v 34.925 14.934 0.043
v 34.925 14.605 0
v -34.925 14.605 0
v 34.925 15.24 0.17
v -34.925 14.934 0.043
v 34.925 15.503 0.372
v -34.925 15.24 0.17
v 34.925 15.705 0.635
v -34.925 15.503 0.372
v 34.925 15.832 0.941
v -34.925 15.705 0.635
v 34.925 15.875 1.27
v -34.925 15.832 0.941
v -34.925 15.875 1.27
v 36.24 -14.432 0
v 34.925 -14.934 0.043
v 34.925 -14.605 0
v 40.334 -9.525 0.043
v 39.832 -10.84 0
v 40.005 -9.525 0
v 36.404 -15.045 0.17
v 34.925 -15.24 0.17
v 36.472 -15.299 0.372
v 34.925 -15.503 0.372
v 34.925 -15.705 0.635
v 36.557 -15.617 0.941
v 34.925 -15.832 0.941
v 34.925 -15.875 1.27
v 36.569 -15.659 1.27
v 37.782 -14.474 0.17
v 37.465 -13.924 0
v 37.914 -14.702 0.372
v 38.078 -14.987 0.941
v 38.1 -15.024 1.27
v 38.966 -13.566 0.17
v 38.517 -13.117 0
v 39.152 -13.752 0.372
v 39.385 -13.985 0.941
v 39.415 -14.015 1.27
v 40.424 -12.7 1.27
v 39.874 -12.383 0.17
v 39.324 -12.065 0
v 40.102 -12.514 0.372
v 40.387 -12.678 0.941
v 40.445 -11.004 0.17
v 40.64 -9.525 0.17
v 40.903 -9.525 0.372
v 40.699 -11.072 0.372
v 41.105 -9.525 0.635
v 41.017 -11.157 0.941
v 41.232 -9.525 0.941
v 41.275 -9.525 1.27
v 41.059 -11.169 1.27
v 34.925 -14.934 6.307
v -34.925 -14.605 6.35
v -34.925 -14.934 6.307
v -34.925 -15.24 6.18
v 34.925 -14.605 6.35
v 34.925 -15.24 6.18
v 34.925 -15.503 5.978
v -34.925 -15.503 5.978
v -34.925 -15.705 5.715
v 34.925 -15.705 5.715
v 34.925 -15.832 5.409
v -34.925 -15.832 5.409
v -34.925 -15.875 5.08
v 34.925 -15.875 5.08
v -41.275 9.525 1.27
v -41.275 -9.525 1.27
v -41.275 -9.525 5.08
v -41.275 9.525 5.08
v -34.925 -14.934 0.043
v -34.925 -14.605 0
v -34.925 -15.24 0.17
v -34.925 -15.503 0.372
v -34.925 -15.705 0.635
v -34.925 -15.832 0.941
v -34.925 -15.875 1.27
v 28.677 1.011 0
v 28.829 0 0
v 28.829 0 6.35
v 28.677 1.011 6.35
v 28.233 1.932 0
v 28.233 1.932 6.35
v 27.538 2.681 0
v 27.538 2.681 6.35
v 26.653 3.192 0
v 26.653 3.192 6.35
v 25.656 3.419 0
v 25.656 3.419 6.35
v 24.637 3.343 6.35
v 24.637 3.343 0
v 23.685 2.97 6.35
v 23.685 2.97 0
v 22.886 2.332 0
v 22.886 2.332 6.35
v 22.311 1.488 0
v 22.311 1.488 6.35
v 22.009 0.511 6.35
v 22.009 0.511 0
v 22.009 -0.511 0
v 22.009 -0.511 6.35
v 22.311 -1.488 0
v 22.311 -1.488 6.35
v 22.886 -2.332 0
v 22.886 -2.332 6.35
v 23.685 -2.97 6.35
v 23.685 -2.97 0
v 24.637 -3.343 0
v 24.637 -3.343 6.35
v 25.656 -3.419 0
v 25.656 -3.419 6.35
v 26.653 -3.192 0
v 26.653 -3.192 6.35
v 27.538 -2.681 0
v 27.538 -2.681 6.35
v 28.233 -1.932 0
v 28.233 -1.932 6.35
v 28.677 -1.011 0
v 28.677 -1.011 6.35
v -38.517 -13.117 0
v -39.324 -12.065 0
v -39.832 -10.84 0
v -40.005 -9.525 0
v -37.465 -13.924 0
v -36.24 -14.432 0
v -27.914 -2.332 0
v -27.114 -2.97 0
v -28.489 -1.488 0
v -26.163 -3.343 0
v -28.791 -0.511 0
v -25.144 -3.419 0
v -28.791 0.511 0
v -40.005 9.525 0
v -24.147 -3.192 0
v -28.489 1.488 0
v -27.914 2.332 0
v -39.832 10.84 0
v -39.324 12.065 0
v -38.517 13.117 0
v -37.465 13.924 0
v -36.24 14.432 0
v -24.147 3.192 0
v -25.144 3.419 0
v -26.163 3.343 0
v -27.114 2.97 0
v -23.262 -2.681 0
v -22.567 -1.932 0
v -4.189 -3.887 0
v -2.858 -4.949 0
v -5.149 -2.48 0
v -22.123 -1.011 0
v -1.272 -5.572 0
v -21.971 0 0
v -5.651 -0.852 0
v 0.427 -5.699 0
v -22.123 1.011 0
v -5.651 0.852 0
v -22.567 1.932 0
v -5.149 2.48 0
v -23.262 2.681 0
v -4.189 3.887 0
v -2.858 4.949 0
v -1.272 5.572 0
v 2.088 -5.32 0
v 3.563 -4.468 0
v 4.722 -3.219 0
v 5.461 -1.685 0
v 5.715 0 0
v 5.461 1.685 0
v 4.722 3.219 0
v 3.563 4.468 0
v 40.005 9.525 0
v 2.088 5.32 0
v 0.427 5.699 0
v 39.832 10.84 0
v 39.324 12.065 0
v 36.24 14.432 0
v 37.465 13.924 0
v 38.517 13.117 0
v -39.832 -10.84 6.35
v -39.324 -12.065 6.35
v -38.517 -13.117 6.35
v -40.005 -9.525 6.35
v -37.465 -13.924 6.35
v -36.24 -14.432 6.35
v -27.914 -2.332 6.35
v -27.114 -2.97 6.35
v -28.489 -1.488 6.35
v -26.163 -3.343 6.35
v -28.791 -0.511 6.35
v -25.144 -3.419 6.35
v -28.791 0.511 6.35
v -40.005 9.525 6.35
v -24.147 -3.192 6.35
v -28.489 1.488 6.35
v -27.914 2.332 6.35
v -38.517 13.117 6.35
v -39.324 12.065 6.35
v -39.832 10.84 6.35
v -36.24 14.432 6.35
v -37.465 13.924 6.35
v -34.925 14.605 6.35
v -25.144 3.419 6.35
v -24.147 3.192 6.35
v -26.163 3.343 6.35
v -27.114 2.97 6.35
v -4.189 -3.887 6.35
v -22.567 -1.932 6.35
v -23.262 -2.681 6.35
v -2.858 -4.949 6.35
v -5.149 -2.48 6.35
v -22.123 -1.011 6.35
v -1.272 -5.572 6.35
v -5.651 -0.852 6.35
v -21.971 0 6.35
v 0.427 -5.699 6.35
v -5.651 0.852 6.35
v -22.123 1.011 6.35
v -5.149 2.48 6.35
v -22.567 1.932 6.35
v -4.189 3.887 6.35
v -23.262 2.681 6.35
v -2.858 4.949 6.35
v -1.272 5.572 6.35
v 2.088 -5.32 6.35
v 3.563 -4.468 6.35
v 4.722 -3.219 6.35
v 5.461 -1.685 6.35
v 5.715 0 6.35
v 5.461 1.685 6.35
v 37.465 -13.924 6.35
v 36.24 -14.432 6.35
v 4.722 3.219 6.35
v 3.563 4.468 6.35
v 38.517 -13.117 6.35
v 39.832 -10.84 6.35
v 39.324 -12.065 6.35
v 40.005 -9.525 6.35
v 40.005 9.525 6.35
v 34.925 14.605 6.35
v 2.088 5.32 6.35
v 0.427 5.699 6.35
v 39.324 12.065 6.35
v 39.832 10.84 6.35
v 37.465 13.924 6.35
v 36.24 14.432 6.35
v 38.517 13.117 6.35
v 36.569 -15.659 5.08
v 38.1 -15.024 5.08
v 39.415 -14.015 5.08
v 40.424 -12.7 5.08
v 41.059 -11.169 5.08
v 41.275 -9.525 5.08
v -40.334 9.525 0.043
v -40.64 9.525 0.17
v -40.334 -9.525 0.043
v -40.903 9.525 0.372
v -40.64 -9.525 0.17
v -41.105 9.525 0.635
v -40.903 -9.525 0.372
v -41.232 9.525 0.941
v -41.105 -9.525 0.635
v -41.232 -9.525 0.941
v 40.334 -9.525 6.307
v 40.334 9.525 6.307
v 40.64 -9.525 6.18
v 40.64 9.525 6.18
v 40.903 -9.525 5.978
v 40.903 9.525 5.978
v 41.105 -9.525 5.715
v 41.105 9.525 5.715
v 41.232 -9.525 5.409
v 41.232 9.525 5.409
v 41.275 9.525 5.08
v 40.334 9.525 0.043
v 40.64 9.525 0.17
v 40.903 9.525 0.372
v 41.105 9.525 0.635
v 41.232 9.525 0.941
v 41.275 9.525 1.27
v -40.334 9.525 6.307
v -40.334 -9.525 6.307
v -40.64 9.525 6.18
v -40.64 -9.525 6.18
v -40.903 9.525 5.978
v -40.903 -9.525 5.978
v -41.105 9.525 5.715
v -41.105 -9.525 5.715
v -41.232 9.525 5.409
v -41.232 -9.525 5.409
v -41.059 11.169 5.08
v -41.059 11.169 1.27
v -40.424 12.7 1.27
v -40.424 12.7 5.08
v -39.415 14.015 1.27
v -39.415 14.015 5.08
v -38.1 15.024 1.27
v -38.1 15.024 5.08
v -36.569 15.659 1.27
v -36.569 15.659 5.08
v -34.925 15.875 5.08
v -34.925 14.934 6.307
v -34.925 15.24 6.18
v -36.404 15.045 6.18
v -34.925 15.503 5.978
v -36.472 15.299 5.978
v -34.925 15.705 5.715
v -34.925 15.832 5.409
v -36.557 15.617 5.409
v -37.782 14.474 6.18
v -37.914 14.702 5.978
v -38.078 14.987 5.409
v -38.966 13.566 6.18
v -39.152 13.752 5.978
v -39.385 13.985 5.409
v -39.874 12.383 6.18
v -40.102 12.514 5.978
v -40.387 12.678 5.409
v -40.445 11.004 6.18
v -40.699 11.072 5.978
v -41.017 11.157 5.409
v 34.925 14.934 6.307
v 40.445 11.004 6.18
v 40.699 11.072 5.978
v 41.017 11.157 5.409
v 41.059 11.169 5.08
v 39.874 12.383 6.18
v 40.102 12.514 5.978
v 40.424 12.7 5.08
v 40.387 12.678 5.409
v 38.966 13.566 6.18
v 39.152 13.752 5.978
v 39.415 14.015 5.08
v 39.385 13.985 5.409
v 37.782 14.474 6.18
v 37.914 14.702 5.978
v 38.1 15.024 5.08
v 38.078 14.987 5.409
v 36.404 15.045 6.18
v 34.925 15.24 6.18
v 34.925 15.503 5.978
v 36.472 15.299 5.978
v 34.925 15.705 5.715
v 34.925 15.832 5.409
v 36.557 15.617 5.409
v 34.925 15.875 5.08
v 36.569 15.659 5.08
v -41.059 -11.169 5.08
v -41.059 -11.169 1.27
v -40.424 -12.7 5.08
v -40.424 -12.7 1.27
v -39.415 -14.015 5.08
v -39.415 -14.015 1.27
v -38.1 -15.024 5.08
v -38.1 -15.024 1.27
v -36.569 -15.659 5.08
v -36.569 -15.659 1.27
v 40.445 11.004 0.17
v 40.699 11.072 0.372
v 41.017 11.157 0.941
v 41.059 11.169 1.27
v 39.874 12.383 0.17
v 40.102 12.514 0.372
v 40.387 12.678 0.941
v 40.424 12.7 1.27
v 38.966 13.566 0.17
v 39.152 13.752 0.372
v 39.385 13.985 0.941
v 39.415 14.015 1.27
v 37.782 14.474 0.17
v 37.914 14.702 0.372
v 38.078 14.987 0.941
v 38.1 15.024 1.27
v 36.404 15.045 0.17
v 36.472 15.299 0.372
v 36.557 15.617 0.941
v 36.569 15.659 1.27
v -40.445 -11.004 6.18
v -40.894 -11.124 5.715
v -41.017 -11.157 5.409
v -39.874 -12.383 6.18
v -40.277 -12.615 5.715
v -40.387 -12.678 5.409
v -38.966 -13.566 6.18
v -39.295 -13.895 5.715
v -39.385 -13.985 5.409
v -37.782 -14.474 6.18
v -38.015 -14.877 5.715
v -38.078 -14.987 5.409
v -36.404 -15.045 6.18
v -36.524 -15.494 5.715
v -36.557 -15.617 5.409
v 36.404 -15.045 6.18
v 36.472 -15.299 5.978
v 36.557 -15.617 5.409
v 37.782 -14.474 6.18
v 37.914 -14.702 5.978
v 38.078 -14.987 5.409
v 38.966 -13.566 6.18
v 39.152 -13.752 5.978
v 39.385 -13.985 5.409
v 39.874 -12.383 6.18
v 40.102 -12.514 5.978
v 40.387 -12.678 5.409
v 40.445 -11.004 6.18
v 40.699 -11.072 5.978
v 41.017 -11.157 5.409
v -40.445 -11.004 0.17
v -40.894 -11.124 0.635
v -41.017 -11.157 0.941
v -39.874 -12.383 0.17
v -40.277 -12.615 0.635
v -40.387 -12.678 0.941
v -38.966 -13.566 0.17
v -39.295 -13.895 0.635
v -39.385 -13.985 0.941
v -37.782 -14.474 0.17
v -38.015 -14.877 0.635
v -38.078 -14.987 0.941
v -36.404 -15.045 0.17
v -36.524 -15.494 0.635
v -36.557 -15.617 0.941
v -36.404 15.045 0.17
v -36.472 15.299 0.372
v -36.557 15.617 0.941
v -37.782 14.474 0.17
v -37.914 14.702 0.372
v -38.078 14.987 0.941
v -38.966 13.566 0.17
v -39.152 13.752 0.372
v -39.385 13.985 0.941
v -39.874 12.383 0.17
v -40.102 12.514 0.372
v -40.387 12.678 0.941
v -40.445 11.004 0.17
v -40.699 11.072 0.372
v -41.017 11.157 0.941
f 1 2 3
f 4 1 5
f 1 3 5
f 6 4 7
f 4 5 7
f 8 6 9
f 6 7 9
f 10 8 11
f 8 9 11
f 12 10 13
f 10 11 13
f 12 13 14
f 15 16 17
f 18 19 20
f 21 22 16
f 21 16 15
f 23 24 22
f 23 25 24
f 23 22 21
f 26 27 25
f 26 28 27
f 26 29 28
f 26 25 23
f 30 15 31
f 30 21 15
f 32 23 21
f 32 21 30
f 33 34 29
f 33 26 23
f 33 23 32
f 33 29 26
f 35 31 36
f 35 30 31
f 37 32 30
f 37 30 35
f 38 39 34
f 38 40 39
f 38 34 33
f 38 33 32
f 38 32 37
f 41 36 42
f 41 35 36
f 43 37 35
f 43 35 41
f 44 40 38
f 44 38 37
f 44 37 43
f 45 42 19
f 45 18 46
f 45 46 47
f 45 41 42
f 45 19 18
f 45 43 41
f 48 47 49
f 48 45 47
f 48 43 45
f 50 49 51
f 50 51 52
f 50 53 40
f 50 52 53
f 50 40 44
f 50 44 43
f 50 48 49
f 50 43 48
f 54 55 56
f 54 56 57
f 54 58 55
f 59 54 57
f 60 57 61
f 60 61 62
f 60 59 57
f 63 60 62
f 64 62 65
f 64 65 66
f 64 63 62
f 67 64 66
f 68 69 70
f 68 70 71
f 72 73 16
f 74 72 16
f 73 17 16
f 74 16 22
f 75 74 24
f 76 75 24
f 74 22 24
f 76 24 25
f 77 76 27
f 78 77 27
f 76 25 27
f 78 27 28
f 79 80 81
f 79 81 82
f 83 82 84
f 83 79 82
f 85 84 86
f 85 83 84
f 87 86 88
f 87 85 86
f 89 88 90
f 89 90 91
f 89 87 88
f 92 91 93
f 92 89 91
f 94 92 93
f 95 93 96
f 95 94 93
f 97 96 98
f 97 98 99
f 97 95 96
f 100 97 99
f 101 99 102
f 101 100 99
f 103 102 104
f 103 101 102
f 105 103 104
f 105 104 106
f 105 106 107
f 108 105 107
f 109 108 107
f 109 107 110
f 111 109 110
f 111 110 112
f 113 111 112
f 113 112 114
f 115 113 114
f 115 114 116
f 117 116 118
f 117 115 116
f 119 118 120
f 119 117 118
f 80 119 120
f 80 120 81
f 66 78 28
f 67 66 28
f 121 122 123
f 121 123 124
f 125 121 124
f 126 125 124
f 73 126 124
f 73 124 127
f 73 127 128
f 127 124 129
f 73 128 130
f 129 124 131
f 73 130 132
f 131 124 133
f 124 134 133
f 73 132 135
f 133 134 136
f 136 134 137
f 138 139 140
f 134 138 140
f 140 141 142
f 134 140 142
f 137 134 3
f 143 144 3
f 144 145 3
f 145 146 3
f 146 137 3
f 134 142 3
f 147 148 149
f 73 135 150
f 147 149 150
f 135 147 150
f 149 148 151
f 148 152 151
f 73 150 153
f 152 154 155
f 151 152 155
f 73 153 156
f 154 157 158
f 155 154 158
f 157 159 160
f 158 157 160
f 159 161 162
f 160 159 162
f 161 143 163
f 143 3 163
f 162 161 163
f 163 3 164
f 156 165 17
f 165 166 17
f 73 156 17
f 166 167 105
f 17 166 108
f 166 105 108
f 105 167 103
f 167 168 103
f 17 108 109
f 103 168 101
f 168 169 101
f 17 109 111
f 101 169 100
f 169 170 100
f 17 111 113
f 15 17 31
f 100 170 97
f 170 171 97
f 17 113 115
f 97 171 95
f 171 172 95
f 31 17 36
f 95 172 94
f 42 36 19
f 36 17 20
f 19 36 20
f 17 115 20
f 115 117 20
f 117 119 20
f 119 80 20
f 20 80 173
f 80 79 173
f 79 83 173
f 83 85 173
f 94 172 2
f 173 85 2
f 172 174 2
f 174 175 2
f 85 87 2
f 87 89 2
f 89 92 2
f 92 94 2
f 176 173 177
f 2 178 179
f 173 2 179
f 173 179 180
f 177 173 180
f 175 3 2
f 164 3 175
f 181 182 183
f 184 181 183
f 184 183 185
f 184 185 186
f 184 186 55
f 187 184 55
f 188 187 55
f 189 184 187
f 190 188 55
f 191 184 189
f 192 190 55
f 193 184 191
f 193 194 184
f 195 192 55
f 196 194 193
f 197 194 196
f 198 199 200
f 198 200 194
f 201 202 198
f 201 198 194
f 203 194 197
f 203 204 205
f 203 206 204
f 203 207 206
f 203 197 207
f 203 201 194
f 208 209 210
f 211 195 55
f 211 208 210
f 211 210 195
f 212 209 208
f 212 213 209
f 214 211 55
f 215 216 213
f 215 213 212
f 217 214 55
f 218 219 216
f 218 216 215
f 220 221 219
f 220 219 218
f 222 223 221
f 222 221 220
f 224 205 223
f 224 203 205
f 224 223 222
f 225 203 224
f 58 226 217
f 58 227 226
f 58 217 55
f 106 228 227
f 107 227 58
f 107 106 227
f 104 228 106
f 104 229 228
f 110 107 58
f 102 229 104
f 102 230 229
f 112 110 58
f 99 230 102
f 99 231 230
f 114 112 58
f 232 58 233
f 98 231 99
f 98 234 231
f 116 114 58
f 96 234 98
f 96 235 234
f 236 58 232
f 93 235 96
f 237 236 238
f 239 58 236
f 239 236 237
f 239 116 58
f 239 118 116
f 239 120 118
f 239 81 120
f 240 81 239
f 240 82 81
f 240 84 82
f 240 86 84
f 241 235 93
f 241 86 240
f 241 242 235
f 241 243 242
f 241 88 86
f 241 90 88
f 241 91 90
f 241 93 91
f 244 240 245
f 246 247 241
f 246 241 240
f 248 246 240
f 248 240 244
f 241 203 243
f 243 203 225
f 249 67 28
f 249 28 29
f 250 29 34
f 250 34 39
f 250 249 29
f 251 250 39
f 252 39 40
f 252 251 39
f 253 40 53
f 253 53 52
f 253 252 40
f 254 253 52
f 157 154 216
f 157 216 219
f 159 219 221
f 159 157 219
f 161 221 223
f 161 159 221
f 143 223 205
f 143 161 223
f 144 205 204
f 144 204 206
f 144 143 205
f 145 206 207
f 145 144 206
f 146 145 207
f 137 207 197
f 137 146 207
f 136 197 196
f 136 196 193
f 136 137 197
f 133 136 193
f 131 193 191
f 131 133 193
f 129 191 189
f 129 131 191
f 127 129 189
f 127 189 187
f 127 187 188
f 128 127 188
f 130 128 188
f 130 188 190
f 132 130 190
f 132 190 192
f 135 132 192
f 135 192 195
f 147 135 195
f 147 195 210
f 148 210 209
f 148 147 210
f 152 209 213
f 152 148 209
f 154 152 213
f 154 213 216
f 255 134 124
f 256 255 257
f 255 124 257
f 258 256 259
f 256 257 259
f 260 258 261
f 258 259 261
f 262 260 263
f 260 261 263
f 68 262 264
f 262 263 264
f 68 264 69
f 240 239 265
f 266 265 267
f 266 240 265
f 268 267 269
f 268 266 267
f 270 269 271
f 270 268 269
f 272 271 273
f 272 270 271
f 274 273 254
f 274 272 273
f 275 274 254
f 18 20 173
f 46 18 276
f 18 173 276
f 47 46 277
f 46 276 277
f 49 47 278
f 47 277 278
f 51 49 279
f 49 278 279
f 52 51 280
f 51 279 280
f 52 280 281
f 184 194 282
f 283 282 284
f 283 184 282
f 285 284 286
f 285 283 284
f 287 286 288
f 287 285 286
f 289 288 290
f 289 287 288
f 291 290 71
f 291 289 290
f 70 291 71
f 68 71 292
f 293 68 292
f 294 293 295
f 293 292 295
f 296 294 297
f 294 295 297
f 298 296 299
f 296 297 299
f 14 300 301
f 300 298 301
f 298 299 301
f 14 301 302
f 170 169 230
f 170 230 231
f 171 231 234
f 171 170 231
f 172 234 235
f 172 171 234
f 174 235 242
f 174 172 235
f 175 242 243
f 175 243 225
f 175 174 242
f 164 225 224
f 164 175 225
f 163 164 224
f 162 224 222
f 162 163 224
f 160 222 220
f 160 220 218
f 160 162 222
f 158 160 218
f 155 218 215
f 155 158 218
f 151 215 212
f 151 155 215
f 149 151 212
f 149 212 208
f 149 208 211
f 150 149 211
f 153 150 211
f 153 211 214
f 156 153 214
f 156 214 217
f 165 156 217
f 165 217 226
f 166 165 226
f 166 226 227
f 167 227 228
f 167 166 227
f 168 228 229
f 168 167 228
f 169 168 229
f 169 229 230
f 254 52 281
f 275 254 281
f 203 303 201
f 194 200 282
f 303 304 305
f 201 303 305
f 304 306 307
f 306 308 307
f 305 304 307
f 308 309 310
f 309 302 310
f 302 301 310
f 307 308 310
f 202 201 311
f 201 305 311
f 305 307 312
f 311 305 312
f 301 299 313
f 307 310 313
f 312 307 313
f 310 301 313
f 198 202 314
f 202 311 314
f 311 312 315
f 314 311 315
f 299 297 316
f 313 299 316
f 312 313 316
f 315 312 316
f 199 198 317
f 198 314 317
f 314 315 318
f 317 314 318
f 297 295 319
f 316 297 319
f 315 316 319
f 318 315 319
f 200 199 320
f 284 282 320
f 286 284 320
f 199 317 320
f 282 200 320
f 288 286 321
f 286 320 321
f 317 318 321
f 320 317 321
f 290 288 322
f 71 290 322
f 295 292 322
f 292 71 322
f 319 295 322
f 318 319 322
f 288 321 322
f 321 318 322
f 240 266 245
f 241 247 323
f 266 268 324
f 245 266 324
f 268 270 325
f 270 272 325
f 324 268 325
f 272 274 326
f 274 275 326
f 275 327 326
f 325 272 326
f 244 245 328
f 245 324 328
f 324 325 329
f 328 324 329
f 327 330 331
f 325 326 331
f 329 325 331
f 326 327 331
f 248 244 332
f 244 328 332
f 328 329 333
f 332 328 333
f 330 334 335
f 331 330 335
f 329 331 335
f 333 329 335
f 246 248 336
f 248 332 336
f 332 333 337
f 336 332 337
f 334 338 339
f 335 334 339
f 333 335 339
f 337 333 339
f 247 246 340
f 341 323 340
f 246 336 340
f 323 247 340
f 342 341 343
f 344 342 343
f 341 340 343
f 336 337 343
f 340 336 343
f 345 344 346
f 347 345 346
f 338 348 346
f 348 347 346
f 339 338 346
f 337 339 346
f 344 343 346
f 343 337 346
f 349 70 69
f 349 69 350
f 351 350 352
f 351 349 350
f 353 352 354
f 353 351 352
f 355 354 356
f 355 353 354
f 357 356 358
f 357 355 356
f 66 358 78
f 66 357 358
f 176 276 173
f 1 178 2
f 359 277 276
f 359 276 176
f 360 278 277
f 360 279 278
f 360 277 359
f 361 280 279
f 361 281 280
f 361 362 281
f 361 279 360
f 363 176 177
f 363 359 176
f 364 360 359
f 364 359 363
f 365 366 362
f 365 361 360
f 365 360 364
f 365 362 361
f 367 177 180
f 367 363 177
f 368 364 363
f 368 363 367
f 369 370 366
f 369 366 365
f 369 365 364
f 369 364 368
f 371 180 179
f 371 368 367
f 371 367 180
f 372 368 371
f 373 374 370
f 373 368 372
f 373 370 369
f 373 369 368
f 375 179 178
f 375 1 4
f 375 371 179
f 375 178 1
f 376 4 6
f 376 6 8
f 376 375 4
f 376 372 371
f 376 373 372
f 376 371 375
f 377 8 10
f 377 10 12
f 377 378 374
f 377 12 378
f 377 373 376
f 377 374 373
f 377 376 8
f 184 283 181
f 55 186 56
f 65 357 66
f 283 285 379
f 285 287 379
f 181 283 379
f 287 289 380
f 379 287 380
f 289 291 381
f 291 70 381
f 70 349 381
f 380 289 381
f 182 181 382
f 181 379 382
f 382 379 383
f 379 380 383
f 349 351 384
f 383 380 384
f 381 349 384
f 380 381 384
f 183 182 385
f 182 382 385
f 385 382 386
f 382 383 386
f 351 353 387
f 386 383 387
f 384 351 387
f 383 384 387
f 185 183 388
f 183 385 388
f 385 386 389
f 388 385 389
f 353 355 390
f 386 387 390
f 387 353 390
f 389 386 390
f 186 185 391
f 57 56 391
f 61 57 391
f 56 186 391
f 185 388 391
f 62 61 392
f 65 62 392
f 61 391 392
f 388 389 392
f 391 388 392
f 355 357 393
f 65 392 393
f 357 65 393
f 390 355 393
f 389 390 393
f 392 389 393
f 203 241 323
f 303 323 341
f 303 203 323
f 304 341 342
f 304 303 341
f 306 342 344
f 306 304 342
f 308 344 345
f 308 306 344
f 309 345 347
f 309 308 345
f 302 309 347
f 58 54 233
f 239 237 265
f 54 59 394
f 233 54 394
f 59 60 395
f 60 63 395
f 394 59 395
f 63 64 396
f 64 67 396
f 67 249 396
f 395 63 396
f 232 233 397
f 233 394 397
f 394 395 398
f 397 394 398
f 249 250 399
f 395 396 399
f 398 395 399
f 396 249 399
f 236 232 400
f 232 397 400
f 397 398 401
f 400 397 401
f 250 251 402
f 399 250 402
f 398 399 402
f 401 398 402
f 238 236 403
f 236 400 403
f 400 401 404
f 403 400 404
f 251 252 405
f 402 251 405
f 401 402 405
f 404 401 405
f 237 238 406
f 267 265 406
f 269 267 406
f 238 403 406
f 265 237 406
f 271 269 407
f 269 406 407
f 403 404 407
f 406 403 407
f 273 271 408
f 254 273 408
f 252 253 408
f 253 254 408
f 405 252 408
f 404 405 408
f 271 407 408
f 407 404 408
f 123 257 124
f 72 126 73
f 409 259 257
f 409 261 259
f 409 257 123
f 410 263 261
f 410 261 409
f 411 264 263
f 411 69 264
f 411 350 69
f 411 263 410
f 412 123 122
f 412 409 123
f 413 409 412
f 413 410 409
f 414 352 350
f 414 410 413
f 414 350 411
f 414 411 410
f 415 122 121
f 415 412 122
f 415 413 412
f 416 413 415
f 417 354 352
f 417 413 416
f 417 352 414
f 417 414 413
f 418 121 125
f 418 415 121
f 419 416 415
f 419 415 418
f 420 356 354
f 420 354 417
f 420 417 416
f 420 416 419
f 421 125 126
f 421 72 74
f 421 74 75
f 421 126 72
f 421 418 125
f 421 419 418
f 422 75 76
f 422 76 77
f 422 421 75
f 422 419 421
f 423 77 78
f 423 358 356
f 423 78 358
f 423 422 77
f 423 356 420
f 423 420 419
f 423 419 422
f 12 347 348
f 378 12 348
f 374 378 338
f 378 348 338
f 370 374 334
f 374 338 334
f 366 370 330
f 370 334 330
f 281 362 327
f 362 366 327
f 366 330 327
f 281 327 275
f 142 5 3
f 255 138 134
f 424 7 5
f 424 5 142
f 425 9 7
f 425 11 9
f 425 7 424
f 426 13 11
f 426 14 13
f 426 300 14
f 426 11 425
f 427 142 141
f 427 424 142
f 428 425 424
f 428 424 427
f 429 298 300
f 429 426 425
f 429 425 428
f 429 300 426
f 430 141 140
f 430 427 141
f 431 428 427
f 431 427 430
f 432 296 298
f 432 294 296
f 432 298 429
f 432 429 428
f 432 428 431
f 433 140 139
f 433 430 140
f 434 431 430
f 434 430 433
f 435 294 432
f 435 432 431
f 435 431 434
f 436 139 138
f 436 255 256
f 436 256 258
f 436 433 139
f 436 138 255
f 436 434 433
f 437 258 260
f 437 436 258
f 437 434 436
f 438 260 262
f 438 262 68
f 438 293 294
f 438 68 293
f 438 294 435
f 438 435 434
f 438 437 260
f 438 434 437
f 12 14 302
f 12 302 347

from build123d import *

# Parameters (mm, degrees)
F0_W     = 82.55
F0_H     = 31.75
F0_R     = 3.429
F0_R_2   = 5.715
F1_DEPTH = 6.35
F2_R     = 6.35
F3_R     = 1.27


with BuildPart() as f1:
    # F0 (on Top) → F1 (new body)
    with BuildSketch(Plane.XY):
        Rectangle(F0_W, F0_H)
        with Locations((-25.4, 0)):
            Circle(F0_R, mode=Mode.SUBTRACT)
        Circle(F0_R_2, mode=Mode.SUBTRACT)
        with Locations((25.4, 0)):
            Circle(F0_R, mode=Mode.SUBTRACT)
    extrude(amount=F1_DEPTH)

    # F2
    f2_edges = [f1.edges().sort_by_distance(p)[0] for p in [
        (-41.275, -15.875, 3.175),
        (41.275, -15.875, 3.175),
        (41.275, 15.875, 3.175),
        (-41.275, 15.875, 3.175),
    ]]
    fillet(f2_edges, radius=F2_R)

    # F3
    f3_edges = [f1.edges().sort_by_distance(p)[0] for p in [
        (0, -15.875, 6.35),
        (0, -15.875, 0),
    ]]
    fillet(f3_edges, radius=F3_R)


solid = f1.part
